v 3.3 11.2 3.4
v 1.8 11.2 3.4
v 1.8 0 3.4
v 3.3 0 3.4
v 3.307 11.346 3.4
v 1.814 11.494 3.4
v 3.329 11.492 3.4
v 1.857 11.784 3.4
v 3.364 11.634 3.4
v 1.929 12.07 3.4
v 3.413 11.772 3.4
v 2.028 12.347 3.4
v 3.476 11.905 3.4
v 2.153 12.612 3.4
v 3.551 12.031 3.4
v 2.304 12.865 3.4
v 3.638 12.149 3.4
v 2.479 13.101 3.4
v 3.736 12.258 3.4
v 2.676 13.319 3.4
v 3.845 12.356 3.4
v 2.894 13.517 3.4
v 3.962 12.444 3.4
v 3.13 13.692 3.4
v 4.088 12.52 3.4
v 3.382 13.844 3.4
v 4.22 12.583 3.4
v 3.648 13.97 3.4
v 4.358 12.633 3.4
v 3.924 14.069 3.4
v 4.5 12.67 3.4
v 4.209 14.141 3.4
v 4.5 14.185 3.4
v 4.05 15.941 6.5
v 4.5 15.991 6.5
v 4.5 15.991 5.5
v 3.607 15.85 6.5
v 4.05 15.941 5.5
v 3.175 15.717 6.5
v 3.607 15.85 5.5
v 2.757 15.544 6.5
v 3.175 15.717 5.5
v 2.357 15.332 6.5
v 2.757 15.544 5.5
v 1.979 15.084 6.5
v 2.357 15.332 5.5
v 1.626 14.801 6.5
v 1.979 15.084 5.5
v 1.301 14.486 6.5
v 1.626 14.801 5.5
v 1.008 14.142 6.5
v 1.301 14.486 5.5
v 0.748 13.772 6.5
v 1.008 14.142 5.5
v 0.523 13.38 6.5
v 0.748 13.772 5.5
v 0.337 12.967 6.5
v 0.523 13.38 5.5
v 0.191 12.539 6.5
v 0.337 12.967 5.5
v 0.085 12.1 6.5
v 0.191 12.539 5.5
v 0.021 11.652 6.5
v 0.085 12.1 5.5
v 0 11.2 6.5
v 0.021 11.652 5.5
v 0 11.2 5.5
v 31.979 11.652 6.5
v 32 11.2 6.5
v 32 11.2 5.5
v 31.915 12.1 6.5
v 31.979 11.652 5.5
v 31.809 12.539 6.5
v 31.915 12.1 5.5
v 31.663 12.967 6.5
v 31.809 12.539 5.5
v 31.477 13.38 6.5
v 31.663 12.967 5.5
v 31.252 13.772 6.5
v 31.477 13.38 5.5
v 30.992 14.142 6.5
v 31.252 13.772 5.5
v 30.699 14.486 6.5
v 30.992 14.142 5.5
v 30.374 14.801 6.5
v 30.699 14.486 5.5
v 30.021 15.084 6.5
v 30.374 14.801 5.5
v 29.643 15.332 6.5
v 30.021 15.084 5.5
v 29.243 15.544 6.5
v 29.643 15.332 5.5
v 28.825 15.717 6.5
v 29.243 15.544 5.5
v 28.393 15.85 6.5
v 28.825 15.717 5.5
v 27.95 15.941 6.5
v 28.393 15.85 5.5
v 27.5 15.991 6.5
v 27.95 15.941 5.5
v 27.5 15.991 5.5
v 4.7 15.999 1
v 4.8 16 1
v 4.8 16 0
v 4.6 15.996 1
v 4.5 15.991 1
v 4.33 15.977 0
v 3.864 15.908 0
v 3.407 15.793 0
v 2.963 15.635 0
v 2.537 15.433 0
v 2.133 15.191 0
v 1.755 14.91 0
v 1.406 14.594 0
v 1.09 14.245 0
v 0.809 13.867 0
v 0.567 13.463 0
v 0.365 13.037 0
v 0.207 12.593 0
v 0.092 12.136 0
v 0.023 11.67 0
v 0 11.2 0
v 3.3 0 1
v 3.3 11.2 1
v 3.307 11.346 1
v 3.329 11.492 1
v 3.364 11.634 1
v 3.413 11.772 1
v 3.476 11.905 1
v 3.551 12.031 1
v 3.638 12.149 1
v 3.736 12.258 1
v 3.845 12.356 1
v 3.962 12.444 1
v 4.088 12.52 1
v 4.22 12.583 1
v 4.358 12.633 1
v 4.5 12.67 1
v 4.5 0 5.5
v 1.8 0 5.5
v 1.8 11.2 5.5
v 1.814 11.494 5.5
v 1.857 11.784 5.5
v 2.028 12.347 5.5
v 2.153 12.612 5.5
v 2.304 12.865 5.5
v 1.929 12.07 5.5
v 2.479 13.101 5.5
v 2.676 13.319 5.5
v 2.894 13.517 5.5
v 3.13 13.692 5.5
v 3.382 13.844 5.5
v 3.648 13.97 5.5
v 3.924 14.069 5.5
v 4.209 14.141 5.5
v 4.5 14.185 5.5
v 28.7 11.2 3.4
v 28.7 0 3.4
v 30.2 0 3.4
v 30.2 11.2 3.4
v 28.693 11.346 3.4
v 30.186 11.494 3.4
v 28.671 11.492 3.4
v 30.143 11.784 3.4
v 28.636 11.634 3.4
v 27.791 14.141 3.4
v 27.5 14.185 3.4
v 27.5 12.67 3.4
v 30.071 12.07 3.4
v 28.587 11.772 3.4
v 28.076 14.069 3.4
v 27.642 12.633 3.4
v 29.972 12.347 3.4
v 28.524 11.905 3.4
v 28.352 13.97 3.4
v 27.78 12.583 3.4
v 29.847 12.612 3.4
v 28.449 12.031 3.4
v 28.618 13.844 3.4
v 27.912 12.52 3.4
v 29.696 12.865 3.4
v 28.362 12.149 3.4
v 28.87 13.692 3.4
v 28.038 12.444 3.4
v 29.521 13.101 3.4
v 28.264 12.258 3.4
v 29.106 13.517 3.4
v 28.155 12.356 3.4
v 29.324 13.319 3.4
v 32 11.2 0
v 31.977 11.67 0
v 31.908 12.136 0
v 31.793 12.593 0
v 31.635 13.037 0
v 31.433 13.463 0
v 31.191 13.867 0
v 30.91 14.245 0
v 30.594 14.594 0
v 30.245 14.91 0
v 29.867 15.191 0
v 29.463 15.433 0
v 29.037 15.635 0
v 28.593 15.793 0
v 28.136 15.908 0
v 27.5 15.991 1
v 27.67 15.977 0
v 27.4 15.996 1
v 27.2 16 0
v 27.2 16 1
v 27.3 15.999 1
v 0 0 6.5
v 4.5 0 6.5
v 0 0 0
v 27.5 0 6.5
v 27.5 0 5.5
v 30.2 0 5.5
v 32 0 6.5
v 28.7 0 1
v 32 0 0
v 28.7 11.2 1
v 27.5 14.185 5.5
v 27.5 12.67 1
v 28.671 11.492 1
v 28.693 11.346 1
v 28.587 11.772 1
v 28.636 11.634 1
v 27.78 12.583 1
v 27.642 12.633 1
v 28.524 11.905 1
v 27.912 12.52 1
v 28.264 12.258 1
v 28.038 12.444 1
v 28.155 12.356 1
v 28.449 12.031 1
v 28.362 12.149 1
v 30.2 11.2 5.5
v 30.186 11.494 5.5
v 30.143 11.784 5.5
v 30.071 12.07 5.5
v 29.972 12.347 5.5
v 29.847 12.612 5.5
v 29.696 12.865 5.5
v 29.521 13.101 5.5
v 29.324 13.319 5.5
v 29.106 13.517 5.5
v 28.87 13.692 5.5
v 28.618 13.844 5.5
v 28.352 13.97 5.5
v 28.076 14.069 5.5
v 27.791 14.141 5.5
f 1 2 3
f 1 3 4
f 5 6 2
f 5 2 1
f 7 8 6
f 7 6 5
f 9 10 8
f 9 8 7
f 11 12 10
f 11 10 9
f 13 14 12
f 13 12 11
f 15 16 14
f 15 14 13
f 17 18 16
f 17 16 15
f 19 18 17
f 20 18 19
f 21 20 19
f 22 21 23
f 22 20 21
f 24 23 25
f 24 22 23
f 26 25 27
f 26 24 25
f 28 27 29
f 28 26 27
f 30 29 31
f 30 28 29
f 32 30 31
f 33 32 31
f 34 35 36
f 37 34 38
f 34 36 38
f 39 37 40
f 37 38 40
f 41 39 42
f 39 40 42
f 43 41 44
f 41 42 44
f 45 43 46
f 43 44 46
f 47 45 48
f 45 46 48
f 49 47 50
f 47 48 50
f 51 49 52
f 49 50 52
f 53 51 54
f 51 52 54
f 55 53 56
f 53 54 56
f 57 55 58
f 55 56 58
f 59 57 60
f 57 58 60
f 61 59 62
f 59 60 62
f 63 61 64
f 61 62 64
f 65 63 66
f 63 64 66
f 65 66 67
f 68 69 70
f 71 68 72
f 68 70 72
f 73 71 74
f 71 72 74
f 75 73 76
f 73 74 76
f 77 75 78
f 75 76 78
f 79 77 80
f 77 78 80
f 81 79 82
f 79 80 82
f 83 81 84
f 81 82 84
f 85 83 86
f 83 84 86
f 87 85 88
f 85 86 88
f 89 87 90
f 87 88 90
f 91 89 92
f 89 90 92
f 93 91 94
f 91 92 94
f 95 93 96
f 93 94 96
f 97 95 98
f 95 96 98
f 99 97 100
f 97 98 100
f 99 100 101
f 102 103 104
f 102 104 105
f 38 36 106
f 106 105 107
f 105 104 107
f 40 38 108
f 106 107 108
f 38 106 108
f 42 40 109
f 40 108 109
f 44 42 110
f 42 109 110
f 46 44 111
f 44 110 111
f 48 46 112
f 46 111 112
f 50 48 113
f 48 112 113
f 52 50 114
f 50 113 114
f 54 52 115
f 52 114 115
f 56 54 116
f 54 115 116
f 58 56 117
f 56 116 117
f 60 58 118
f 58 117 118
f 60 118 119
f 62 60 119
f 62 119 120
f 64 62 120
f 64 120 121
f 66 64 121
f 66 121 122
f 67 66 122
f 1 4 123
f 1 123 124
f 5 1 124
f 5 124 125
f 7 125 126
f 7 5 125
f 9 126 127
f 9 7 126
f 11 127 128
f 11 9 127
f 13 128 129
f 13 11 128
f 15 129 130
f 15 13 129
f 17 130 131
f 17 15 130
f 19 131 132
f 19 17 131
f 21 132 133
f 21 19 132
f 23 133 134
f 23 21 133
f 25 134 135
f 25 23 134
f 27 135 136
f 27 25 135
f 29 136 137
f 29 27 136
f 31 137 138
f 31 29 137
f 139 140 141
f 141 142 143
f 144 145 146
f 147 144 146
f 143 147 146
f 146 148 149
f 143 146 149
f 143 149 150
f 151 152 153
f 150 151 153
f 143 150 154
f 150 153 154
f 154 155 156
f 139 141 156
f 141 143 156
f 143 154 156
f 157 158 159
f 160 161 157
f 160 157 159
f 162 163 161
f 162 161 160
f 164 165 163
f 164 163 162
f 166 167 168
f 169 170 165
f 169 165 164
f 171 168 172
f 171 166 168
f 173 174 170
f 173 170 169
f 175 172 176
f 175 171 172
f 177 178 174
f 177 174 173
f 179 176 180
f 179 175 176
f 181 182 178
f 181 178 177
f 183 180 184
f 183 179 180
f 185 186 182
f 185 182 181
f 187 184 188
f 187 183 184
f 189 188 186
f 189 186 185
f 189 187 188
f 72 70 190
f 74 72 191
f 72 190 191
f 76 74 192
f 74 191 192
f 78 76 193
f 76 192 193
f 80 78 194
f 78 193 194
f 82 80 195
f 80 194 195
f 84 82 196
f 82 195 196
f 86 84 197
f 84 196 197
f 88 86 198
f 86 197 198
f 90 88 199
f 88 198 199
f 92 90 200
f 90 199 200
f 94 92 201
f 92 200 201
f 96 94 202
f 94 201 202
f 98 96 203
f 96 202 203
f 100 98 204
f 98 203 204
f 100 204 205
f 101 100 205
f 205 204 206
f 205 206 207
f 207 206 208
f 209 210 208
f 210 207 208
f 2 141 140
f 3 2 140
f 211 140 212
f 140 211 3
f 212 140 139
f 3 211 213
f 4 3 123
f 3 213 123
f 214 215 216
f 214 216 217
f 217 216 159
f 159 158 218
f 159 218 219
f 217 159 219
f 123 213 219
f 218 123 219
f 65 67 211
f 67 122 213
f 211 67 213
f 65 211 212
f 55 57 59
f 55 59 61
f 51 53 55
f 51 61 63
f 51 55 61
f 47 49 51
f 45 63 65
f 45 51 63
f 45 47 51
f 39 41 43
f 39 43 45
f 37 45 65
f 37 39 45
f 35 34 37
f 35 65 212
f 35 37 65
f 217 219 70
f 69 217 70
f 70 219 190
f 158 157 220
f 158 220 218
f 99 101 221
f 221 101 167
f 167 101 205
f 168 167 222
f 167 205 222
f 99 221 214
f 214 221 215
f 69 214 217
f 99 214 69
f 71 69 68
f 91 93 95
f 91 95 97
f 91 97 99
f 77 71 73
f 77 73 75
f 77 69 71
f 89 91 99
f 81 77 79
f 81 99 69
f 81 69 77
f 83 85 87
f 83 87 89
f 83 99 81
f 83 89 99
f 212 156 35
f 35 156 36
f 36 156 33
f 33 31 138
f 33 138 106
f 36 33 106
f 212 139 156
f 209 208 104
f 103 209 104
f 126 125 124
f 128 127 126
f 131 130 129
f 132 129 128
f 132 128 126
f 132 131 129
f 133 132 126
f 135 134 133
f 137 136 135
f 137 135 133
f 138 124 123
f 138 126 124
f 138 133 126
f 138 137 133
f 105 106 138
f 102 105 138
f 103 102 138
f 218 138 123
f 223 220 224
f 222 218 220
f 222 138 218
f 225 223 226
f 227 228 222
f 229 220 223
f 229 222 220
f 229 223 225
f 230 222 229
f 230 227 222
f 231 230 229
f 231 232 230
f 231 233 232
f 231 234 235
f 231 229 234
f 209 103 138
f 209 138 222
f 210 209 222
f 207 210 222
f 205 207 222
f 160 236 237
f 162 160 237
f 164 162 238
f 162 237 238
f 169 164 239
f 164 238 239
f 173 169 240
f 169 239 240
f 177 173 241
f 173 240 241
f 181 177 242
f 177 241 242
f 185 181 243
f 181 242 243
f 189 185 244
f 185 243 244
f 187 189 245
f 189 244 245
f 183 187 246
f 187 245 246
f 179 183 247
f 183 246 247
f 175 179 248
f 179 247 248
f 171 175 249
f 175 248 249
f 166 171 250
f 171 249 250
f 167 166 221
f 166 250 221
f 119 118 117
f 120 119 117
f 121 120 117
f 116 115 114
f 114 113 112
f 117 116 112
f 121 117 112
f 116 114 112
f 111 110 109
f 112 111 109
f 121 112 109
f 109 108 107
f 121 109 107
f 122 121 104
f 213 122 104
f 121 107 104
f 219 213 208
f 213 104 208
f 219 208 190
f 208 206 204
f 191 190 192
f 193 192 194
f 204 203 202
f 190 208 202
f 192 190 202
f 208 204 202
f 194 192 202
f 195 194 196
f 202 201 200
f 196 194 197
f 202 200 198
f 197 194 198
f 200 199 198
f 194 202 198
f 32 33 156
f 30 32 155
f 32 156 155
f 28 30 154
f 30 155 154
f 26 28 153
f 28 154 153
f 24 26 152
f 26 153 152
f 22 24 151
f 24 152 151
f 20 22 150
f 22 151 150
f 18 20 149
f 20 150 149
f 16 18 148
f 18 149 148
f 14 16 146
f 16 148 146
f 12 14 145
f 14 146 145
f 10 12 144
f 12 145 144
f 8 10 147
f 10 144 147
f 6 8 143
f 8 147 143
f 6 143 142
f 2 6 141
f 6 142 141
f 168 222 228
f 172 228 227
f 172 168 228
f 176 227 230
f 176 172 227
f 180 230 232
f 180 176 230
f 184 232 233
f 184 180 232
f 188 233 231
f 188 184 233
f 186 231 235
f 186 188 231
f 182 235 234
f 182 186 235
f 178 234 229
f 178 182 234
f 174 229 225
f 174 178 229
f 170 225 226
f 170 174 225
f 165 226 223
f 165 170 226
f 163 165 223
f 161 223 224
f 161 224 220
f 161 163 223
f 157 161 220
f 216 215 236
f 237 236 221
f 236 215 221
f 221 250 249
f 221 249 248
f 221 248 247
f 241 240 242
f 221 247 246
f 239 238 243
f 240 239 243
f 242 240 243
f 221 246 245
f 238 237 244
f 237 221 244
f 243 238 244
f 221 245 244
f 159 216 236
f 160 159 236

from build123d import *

# Parameters (mm, degrees)
BOSS_EXTRUDE2_DEPTH     = 5.5
CUT_EXTRUDE1_DEPTH      = 4.5
BOSS_EXTRUDE3_START     = 2.4
BOSS_EXTRUDE3_DEPTH     = 2.4
SALIENTE_EXTRUIR1_DEPTH = 1
CORTAR_EXTRUIR3_REACH   = 38.363
CROQUIS3_W              = 23
CROQUIS3_H              = 4.5


with BuildPart() as part:
    # Sketch3 → Boss-Extrude2 (new body)
    with BuildSketch(Plane.XY):
        with BuildLine():
            Line((0, 0), (32, 0))
            Line((32, 0), (32, 11.2))
            ThreePointArc((32, 11.2), (30.59411255, 14.59411255), (27.2, 16))
            Line((27.2, 16), (4.8, 16))
            ThreePointArc((4.8, 16), (1.40588745, 14.59411255), (0, 11.2))
            Line((0, 11.2), (0, 0))
        make_face()
    extrude(amount=BOSS_EXTRUDE2_DEPTH)

    # Sketch4 → Cut-Extrude1 (cut)
    with BuildSketch(Plane.XY.offset(5.5)):
        with BuildLine():
            Line((1.8, 0), (30.2, 0))
            Line((30.2, 0), (30.2, 11.2))
            ThreePointArc((30.2, 11.2), (29.321320344, 13.321320344), (27.2, 14.2))
            Line((27.2, 14.2), (4.8, 14.2))
            ThreePointArc((4.8, 14.2), (2.678679656, 13.321320344), (1.8, 11.2))
            Line((1.8, 11.2), (1.8, 0))
        make_face()
    extrude(amount=-CUT_EXTRUDE1_DEPTH, mode=Mode.SUBTRACT)

    # Sketch5 → Boss-Extrude3 (add)
    with BuildSketch(Plane.XY.offset(1).offset(BOSS_EXTRUDE3_START)):
        with BuildLine():
            Line((1.8, 11.2), (1.8, 0))
            Line((1.8, 0), (3.3, 0))
            Line((3.3, 0), (3.3, 11.2))
            ThreePointArc((3.3, 11.2), (3.739339828, 12.260660172), (4.8, 12.7))
            Line((4.8, 12.7), (27.2, 12.7))
            ThreePointArc((27.2, 12.7), (28.260660172, 12.260660172), (28.7, 11.2))
            Line((28.7, 11.2), (28.7, 0))
            Line((28.7, 0), (30.2, 0))
            Line((30.2, 0), (30.2, 11.2))
            ThreePointArc((30.2, 11.2), (29.321320344, 13.321320344), (27.2, 14.2))
            Line((27.2, 14.2), (4.8, 14.2))
            ThreePointArc((4.8, 14.2), (2.678679656, 13.321320344), (1.8, 11.2))
        make_face()
    extrude(amount=-BOSS_EXTRUDE3_DEPTH)

    # Croquis1 → Saliente-Extruir1 (add)
    with BuildSketch(Plane.XY.offset(5.5)):
        with BuildLine():
            Line((4.5, 0), (4.5, 15.990615827))
            ThreePointArc((4.5, 15.990615827), (1.301428863, 14.486335345), (0, 11.2))
            Line((0, 11.2), (0, 0))
            Line((0, 0), (4.5, 0))
        make_face()
        with BuildLine():
            Line((27.5, 15.990615827), (27.5, 0))
            Line((27.5, 0), (32, 0))
            Line((32, 0), (32, 11.2))
            ThreePointArc((32, 11.2), (30.698571137, 14.486335345), (27.5, 15.990615827))
        make_face()
    extrude(amount=SALIENTE_EXTRUIR1_DEPTH)

    # Croquis3 → Cortar-Extruir3 (cut, up to next)
    with BuildSketch(Plane(origin=(0, 16, 0), x_dir=(1, 0, 0), z_dir=(0, 1, 0)), mode=Mode.PRIVATE) as cortar_extruir3_sk1:
        with Locations((16, -3.25)):
            Rectangle(CROQUIS3_W, CROQUIS3_H)
    cortar_extruir3_tool1 = extrude(cortar_extruir3_sk1.sketch, amount=-CORTAR_EXTRUIR3_REACH, mode=Mode.PRIVATE) & part.part
    add(cortar_extruir3_tool1.solids().sort_by_distance((16, 16, 3.25))[0], mode=Mode.SUBTRACT)


solid = part.part
